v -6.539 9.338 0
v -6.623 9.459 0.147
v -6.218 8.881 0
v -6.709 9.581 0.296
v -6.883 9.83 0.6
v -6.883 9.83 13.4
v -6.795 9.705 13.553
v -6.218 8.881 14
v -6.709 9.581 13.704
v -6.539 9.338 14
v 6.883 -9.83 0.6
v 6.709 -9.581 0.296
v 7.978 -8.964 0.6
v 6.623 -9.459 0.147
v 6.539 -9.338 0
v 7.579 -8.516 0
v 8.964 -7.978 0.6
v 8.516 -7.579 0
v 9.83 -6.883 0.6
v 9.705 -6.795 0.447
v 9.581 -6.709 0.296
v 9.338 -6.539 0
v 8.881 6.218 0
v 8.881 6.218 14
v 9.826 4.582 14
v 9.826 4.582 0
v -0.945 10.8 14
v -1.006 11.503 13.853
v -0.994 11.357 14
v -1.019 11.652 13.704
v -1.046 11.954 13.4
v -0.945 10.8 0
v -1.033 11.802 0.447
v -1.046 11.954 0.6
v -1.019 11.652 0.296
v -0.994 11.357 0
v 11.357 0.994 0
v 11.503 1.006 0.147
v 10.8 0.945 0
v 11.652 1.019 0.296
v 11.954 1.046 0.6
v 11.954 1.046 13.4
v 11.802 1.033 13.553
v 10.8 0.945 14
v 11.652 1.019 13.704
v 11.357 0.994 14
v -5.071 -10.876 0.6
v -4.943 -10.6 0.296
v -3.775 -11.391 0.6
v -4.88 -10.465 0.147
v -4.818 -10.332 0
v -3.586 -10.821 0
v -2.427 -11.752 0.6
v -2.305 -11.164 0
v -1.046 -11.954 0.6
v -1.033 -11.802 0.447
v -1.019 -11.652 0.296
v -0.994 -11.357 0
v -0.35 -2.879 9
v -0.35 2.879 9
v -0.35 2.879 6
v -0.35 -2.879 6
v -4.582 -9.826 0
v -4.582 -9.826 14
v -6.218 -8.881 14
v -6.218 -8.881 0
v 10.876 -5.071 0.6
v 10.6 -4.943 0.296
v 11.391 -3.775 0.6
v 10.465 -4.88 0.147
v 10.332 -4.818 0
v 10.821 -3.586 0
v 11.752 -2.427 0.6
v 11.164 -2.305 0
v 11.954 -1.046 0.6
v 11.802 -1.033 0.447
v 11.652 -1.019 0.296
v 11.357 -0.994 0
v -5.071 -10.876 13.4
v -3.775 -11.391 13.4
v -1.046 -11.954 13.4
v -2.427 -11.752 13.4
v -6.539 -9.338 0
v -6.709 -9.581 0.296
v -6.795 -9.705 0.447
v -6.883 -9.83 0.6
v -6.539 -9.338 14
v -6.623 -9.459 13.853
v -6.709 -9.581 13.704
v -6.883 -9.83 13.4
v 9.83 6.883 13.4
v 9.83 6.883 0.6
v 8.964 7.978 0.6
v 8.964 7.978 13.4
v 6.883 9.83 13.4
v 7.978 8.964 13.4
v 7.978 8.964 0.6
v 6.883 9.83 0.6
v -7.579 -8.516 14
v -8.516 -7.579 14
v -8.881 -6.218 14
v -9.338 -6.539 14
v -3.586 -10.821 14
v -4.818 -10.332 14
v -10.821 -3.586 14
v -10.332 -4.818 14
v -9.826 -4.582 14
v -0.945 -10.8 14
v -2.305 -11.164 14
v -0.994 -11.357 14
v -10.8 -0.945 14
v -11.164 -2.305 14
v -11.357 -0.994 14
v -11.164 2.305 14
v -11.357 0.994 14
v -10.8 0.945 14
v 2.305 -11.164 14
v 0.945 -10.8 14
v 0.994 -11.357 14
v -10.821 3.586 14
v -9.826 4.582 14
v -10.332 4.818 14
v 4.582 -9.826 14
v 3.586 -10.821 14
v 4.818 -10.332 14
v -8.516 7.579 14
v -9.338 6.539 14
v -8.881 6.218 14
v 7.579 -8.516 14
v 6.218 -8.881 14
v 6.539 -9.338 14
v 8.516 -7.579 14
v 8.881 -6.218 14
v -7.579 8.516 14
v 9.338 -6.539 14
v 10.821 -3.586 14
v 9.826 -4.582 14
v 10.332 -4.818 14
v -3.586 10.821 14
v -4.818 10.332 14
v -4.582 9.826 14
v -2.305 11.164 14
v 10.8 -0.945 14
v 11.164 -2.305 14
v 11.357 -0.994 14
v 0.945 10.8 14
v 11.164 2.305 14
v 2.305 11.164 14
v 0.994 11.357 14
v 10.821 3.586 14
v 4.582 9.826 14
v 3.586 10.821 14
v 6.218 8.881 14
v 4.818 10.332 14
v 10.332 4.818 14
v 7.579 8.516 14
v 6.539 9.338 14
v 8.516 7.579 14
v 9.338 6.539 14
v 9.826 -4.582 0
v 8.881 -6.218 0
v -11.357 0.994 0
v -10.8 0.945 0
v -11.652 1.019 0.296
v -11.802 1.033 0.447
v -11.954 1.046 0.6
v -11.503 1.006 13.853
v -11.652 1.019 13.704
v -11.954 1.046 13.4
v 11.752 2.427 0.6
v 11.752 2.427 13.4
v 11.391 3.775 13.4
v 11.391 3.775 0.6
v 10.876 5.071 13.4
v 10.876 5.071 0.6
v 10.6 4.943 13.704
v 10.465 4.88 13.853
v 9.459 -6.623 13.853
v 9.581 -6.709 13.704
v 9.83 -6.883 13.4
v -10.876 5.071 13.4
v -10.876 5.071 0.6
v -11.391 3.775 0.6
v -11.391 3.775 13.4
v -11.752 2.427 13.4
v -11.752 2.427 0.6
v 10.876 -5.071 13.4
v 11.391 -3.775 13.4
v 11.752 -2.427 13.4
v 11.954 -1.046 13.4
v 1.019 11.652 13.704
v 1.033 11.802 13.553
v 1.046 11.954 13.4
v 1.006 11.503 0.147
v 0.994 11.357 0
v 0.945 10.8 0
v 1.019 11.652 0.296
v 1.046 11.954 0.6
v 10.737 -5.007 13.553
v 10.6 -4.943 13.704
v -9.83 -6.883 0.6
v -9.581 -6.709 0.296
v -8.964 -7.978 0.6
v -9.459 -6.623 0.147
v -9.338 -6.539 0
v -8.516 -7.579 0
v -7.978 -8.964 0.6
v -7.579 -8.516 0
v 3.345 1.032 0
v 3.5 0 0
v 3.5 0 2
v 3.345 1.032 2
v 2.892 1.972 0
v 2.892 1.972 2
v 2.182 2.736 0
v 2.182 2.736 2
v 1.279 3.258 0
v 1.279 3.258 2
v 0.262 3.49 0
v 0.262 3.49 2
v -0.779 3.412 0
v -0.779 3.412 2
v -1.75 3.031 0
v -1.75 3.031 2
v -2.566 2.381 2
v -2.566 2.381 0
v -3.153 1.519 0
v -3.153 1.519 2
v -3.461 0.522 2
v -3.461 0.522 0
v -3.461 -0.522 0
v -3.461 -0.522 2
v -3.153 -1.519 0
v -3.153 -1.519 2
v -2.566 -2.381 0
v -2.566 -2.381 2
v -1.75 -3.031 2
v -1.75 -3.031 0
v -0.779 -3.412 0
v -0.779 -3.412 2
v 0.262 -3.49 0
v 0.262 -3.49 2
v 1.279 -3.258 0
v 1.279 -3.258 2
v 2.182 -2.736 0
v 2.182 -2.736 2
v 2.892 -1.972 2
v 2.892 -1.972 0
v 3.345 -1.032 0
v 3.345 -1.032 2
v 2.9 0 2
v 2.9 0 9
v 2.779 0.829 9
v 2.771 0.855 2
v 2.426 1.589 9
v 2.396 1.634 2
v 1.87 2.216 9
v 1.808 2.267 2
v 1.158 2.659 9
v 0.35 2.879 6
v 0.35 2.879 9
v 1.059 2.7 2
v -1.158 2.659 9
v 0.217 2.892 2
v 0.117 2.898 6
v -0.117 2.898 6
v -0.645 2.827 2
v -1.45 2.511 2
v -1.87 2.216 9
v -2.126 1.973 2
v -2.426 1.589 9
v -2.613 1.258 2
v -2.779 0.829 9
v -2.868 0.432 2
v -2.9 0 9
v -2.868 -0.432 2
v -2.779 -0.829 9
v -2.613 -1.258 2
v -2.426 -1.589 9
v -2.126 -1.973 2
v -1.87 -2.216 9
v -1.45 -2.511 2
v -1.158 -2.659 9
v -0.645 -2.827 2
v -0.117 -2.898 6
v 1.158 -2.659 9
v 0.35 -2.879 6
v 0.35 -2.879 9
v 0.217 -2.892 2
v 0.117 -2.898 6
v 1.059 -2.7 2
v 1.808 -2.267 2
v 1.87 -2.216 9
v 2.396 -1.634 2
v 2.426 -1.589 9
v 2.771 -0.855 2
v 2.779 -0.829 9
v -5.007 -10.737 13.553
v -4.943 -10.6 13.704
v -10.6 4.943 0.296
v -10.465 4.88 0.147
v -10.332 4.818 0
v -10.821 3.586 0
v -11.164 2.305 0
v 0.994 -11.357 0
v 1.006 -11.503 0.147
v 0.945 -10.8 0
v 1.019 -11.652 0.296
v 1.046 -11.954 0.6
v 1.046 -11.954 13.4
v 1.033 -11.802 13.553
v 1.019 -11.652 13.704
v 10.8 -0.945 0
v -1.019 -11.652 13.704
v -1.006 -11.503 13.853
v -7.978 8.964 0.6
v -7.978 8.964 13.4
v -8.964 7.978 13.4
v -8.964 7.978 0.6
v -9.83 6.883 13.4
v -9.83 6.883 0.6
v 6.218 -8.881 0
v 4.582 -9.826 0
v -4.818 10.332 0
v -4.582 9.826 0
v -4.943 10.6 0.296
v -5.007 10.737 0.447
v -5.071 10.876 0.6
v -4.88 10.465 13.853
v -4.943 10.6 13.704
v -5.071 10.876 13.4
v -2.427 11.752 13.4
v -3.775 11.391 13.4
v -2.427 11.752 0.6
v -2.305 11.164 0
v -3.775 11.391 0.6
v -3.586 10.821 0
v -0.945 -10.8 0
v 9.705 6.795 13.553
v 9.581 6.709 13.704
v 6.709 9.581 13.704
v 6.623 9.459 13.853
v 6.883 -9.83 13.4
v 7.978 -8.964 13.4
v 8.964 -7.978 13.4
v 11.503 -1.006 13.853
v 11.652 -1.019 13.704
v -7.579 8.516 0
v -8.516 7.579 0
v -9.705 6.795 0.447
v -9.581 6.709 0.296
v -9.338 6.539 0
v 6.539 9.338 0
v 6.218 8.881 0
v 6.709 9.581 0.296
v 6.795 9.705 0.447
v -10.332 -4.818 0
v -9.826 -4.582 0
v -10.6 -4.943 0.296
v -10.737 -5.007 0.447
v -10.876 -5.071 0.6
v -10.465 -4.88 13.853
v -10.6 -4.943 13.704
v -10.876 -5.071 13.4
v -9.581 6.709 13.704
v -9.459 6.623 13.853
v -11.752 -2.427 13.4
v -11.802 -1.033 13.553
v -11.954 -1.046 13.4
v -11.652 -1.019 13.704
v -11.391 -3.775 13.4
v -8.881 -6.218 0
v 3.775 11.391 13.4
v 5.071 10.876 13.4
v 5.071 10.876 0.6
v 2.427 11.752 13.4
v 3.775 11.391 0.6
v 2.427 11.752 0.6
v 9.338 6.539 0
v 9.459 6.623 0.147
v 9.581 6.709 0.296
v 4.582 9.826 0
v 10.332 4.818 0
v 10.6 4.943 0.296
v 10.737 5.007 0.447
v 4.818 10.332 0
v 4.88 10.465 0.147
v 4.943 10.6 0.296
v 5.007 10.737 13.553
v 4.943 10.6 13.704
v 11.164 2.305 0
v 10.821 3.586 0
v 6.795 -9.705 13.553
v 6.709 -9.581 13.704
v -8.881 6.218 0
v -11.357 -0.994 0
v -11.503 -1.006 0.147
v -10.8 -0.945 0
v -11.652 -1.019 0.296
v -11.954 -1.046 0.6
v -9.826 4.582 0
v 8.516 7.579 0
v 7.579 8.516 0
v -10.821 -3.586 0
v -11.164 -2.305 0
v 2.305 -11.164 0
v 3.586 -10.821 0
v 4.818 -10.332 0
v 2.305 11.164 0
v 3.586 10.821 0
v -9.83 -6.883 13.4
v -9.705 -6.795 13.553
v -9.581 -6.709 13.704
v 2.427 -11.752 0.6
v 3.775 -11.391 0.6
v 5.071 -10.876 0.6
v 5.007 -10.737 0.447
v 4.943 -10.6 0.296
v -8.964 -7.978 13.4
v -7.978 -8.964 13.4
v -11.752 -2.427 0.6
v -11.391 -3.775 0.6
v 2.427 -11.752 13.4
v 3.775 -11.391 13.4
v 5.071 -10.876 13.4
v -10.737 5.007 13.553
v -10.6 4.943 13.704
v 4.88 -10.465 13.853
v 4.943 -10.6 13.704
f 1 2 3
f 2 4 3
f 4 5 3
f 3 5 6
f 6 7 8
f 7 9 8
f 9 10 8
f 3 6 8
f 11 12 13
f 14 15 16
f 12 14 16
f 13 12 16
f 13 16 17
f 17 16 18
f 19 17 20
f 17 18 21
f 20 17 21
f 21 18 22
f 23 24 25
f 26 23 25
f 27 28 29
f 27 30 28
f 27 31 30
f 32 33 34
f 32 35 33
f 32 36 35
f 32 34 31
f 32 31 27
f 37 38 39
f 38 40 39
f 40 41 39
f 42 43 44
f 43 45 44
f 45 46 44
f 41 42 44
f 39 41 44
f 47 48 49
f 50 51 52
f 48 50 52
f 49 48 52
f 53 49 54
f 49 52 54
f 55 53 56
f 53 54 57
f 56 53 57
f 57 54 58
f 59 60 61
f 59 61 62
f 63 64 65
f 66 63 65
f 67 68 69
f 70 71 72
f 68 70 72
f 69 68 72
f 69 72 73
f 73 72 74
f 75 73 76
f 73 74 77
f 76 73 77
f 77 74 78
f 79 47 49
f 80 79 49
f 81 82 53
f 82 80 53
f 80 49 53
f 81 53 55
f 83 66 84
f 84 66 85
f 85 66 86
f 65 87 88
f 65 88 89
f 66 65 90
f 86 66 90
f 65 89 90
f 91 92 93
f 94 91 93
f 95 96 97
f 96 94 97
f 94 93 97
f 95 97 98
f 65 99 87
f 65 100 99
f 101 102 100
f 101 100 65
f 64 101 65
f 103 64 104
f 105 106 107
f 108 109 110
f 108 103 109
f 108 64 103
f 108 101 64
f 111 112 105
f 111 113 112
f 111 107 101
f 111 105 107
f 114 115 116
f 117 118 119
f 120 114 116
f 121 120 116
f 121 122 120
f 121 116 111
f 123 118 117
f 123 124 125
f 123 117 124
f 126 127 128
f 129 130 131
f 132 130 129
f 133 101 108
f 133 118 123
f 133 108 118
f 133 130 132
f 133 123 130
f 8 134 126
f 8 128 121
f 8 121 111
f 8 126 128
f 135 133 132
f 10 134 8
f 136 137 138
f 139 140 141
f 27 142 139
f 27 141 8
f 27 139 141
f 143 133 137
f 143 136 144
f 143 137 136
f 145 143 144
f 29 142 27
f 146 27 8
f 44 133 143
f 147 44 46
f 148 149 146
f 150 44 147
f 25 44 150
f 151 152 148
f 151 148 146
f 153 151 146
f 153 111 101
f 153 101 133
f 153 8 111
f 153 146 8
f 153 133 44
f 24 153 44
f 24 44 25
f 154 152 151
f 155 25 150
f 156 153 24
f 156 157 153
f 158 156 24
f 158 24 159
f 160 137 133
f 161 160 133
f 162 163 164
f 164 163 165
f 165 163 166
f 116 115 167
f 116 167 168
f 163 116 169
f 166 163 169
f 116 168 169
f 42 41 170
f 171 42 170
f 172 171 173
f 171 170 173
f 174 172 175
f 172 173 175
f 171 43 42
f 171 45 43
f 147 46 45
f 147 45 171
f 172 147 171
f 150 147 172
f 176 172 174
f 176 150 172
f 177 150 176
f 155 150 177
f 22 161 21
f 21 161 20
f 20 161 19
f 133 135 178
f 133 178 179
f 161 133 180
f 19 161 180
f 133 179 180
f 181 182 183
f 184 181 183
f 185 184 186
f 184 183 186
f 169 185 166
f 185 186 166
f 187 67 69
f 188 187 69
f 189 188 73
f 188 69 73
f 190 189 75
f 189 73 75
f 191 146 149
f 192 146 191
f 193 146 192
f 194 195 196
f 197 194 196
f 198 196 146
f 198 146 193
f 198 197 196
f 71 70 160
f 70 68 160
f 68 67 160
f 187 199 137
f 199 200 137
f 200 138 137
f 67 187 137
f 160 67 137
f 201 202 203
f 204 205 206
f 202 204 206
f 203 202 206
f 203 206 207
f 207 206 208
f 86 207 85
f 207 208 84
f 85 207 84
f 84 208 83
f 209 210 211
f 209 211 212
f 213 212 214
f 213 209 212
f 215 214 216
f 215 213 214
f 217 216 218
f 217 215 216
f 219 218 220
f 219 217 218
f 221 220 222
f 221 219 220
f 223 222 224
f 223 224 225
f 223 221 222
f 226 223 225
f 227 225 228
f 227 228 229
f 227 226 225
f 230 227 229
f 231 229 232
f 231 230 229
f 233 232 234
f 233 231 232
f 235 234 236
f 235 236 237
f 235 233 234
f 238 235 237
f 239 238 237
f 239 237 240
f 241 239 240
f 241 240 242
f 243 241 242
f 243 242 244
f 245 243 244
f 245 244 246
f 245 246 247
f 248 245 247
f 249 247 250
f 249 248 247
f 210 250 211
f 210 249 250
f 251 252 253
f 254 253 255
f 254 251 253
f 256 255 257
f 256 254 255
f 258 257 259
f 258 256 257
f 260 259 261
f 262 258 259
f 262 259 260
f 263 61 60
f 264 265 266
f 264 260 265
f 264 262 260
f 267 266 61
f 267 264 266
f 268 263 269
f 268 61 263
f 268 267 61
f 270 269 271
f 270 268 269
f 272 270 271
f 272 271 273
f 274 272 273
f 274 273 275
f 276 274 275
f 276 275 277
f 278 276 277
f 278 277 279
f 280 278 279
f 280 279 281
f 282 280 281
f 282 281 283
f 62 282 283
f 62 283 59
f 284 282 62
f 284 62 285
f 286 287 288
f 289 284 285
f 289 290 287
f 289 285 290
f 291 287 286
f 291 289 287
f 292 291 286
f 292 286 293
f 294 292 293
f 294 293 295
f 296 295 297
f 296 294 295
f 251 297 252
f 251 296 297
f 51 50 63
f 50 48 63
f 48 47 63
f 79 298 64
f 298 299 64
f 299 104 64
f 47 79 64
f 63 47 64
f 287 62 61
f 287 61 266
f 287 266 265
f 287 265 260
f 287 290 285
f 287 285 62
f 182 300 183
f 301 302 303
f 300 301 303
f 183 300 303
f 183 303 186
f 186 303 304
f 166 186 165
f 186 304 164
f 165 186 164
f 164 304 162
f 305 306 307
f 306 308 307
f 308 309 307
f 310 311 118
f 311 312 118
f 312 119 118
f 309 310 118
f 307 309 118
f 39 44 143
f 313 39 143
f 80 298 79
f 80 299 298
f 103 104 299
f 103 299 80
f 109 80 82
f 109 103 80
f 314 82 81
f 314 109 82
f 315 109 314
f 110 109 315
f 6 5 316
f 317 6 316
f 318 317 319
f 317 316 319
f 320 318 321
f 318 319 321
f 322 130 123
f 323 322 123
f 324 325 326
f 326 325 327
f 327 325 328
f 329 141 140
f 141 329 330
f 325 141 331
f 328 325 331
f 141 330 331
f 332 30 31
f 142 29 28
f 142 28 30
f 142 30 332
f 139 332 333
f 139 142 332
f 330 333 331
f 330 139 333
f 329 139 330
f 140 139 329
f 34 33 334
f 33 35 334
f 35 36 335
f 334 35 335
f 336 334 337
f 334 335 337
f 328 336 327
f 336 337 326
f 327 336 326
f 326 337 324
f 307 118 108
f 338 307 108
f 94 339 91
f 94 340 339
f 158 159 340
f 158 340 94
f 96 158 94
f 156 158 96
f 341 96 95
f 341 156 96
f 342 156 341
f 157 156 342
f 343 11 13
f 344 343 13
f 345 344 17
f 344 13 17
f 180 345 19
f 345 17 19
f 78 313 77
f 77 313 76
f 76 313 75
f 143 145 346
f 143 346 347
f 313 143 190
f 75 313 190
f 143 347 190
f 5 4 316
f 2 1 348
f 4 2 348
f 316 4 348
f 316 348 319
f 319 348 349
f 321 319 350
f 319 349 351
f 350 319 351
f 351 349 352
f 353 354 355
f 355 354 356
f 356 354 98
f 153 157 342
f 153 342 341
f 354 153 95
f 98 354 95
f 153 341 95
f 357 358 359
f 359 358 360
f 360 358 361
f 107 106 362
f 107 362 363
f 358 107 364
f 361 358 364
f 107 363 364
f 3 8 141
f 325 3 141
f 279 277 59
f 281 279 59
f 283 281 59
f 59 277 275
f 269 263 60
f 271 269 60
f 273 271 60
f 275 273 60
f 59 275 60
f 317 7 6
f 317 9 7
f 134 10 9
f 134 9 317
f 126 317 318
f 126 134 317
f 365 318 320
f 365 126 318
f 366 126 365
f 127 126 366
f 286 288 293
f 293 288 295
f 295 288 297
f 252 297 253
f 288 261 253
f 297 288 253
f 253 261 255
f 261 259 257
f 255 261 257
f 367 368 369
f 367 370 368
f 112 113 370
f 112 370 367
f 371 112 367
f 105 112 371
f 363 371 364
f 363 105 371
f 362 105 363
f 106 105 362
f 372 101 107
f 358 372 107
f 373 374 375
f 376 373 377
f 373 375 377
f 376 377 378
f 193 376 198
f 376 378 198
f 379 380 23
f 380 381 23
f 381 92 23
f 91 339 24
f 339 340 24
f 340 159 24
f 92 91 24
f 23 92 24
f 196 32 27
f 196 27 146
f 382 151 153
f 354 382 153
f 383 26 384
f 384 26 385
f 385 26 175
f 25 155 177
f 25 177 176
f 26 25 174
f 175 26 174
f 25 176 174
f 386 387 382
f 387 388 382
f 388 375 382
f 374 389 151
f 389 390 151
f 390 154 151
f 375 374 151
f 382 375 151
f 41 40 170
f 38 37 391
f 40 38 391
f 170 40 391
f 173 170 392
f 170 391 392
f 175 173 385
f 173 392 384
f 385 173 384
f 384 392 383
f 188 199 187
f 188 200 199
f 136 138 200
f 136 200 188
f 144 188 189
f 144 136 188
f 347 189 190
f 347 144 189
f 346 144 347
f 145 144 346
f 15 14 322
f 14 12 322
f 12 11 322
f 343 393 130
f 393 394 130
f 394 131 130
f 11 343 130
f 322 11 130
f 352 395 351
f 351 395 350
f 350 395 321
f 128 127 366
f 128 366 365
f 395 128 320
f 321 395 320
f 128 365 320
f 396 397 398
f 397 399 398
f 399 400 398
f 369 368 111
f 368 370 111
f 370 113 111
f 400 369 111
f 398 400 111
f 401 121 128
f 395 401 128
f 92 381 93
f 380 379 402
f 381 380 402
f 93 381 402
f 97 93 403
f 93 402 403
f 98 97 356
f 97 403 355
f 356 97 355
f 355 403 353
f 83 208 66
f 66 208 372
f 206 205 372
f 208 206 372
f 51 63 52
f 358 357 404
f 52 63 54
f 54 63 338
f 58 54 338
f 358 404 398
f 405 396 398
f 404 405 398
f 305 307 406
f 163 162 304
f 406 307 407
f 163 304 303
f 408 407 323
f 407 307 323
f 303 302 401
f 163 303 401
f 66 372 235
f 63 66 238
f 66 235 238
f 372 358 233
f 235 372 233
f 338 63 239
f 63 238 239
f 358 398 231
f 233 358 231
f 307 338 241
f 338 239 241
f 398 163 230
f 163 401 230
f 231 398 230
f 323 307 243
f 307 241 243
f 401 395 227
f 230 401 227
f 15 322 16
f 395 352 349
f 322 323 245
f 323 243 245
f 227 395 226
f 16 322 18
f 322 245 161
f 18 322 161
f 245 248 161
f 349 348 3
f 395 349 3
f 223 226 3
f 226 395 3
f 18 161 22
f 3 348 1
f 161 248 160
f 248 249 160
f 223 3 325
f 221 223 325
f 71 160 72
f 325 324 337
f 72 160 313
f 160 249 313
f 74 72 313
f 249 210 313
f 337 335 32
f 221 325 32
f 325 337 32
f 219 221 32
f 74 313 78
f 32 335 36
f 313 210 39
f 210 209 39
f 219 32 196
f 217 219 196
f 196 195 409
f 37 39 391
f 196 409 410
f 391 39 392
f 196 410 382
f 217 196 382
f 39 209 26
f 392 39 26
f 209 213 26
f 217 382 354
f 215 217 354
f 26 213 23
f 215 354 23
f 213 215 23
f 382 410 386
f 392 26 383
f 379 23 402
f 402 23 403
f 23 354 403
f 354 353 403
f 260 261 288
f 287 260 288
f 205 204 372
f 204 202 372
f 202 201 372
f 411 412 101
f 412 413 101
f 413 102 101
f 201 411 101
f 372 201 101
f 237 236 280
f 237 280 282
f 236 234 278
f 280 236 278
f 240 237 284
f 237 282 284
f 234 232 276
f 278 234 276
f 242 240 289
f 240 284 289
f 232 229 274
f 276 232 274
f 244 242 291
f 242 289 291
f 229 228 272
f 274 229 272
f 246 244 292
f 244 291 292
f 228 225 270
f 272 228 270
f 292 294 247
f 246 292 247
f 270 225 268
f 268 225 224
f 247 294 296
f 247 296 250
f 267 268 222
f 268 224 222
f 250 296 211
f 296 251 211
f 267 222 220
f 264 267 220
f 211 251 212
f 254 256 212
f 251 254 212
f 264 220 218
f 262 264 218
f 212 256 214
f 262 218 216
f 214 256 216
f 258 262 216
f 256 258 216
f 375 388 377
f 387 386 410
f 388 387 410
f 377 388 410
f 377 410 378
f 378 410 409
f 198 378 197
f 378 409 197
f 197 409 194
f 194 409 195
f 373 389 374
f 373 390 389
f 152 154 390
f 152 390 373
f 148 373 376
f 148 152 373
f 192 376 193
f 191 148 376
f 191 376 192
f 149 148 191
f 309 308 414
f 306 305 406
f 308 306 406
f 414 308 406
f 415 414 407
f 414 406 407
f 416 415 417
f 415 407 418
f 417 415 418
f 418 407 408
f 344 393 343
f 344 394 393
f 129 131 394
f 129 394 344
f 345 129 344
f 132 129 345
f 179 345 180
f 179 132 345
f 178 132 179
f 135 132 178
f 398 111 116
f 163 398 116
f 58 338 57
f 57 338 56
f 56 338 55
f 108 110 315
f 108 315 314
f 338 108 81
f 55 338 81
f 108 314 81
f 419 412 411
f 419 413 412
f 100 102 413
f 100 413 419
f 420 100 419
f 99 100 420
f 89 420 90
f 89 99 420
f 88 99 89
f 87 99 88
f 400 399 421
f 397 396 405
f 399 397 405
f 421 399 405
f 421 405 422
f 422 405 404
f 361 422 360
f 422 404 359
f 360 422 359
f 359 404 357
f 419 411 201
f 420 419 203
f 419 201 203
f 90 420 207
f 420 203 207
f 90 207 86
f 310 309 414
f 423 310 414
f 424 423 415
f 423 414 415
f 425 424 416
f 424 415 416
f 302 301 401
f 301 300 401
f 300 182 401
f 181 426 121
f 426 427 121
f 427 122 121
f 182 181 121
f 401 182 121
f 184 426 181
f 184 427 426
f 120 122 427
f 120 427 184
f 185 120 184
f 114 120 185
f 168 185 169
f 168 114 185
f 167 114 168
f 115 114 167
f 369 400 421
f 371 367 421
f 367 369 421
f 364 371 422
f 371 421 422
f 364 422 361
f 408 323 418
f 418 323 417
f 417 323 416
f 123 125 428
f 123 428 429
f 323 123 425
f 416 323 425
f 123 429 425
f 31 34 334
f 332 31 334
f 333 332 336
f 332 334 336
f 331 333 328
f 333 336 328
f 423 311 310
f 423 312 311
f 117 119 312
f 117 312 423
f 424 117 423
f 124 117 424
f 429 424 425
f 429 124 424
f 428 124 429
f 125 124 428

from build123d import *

# Parameters (mm, degrees)
SKETCH002_R        = 12
PAD002_DEPTH       = 14
CHAMFER_SIZE       = 0.6
POCKET_DEPTH       = 73.431239
POCKET_DEPTH_BACK  = 87.431239
POLARPATTERN_COUNT = 12
SKETCH_R           = 3.5
POCKET001_DEPTH    = 2
SKETCH004_R        = 2.9
POCKET002_DEPTH    = 9
SKETCH005_W        = 0.7
SKETCH005_H        = 6.120777
PAD_DEPTH          = 3


with BuildPart() as part:
    # Sketch002 → Pad002 (new body)
    with BuildSketch(Plane.XY):
        Circle(SKETCH002_R)
    extrude(amount=PAD002_DEPTH)

    # Chamfer
    chamfer_edges = [part.edges().sort_by_distance(p)[0] for p in [
        (-12, 0, 14),
        (-12, 0, 0),
    ]]
    chamfer(chamfer_edges, length=CHAMFER_SIZE)

    # Sketch003 → Pocket (cut, two sides)
    with BuildSketch(Plane.XY) as pocket_sk:
        Polygon((-1.058613, 12.1), (-0.944878, 10.8), (0.944878, 10.8), (1.058613, 12.1), align=None)
    pocket = extrude(amount=-POCKET_DEPTH, mode=Mode.SUBTRACT) + extrude(pocket_sk.sketch, amount=POCKET_DEPTH_BACK, mode=Mode.SUBTRACT)

    # PolarPattern: Pocket ×12 about axis
    polarpattern_axis = Axis((0, 0, 0), (0, 0, 1))
    for i in range(1, POLARPATTERN_COUNT):
        add(pocket.rotate(polarpattern_axis, i * 360 / POLARPATTERN_COUNT), mode=Mode.SUBTRACT)

    # Sketch → Pocket001 (cut)
    with BuildSketch(Plane.XY):
        Circle(SKETCH_R)
    extrude(amount=POCKET001_DEPTH, mode=Mode.SUBTRACT)

    # Sketch004 → Pocket002 (cut)
    with BuildSketch(Plane.XY):
        Circle(SKETCH004_R)
    extrude(amount=POCKET002_DEPTH, mode=Mode.SUBTRACT)

    # Sketch005 (on Face78 of Pocket002) → Pad (join)
    with BuildSketch(Plane(origin=(0, 0, 9), x_dir=(1, 0, 0), z_dir=(0, 0, -1))):
        with Locations((0, 0.049592)):
            Rectangle(SKETCH005_W, SKETCH005_H)
    extrude(amount=PAD_DEPTH)


solid = part.part
